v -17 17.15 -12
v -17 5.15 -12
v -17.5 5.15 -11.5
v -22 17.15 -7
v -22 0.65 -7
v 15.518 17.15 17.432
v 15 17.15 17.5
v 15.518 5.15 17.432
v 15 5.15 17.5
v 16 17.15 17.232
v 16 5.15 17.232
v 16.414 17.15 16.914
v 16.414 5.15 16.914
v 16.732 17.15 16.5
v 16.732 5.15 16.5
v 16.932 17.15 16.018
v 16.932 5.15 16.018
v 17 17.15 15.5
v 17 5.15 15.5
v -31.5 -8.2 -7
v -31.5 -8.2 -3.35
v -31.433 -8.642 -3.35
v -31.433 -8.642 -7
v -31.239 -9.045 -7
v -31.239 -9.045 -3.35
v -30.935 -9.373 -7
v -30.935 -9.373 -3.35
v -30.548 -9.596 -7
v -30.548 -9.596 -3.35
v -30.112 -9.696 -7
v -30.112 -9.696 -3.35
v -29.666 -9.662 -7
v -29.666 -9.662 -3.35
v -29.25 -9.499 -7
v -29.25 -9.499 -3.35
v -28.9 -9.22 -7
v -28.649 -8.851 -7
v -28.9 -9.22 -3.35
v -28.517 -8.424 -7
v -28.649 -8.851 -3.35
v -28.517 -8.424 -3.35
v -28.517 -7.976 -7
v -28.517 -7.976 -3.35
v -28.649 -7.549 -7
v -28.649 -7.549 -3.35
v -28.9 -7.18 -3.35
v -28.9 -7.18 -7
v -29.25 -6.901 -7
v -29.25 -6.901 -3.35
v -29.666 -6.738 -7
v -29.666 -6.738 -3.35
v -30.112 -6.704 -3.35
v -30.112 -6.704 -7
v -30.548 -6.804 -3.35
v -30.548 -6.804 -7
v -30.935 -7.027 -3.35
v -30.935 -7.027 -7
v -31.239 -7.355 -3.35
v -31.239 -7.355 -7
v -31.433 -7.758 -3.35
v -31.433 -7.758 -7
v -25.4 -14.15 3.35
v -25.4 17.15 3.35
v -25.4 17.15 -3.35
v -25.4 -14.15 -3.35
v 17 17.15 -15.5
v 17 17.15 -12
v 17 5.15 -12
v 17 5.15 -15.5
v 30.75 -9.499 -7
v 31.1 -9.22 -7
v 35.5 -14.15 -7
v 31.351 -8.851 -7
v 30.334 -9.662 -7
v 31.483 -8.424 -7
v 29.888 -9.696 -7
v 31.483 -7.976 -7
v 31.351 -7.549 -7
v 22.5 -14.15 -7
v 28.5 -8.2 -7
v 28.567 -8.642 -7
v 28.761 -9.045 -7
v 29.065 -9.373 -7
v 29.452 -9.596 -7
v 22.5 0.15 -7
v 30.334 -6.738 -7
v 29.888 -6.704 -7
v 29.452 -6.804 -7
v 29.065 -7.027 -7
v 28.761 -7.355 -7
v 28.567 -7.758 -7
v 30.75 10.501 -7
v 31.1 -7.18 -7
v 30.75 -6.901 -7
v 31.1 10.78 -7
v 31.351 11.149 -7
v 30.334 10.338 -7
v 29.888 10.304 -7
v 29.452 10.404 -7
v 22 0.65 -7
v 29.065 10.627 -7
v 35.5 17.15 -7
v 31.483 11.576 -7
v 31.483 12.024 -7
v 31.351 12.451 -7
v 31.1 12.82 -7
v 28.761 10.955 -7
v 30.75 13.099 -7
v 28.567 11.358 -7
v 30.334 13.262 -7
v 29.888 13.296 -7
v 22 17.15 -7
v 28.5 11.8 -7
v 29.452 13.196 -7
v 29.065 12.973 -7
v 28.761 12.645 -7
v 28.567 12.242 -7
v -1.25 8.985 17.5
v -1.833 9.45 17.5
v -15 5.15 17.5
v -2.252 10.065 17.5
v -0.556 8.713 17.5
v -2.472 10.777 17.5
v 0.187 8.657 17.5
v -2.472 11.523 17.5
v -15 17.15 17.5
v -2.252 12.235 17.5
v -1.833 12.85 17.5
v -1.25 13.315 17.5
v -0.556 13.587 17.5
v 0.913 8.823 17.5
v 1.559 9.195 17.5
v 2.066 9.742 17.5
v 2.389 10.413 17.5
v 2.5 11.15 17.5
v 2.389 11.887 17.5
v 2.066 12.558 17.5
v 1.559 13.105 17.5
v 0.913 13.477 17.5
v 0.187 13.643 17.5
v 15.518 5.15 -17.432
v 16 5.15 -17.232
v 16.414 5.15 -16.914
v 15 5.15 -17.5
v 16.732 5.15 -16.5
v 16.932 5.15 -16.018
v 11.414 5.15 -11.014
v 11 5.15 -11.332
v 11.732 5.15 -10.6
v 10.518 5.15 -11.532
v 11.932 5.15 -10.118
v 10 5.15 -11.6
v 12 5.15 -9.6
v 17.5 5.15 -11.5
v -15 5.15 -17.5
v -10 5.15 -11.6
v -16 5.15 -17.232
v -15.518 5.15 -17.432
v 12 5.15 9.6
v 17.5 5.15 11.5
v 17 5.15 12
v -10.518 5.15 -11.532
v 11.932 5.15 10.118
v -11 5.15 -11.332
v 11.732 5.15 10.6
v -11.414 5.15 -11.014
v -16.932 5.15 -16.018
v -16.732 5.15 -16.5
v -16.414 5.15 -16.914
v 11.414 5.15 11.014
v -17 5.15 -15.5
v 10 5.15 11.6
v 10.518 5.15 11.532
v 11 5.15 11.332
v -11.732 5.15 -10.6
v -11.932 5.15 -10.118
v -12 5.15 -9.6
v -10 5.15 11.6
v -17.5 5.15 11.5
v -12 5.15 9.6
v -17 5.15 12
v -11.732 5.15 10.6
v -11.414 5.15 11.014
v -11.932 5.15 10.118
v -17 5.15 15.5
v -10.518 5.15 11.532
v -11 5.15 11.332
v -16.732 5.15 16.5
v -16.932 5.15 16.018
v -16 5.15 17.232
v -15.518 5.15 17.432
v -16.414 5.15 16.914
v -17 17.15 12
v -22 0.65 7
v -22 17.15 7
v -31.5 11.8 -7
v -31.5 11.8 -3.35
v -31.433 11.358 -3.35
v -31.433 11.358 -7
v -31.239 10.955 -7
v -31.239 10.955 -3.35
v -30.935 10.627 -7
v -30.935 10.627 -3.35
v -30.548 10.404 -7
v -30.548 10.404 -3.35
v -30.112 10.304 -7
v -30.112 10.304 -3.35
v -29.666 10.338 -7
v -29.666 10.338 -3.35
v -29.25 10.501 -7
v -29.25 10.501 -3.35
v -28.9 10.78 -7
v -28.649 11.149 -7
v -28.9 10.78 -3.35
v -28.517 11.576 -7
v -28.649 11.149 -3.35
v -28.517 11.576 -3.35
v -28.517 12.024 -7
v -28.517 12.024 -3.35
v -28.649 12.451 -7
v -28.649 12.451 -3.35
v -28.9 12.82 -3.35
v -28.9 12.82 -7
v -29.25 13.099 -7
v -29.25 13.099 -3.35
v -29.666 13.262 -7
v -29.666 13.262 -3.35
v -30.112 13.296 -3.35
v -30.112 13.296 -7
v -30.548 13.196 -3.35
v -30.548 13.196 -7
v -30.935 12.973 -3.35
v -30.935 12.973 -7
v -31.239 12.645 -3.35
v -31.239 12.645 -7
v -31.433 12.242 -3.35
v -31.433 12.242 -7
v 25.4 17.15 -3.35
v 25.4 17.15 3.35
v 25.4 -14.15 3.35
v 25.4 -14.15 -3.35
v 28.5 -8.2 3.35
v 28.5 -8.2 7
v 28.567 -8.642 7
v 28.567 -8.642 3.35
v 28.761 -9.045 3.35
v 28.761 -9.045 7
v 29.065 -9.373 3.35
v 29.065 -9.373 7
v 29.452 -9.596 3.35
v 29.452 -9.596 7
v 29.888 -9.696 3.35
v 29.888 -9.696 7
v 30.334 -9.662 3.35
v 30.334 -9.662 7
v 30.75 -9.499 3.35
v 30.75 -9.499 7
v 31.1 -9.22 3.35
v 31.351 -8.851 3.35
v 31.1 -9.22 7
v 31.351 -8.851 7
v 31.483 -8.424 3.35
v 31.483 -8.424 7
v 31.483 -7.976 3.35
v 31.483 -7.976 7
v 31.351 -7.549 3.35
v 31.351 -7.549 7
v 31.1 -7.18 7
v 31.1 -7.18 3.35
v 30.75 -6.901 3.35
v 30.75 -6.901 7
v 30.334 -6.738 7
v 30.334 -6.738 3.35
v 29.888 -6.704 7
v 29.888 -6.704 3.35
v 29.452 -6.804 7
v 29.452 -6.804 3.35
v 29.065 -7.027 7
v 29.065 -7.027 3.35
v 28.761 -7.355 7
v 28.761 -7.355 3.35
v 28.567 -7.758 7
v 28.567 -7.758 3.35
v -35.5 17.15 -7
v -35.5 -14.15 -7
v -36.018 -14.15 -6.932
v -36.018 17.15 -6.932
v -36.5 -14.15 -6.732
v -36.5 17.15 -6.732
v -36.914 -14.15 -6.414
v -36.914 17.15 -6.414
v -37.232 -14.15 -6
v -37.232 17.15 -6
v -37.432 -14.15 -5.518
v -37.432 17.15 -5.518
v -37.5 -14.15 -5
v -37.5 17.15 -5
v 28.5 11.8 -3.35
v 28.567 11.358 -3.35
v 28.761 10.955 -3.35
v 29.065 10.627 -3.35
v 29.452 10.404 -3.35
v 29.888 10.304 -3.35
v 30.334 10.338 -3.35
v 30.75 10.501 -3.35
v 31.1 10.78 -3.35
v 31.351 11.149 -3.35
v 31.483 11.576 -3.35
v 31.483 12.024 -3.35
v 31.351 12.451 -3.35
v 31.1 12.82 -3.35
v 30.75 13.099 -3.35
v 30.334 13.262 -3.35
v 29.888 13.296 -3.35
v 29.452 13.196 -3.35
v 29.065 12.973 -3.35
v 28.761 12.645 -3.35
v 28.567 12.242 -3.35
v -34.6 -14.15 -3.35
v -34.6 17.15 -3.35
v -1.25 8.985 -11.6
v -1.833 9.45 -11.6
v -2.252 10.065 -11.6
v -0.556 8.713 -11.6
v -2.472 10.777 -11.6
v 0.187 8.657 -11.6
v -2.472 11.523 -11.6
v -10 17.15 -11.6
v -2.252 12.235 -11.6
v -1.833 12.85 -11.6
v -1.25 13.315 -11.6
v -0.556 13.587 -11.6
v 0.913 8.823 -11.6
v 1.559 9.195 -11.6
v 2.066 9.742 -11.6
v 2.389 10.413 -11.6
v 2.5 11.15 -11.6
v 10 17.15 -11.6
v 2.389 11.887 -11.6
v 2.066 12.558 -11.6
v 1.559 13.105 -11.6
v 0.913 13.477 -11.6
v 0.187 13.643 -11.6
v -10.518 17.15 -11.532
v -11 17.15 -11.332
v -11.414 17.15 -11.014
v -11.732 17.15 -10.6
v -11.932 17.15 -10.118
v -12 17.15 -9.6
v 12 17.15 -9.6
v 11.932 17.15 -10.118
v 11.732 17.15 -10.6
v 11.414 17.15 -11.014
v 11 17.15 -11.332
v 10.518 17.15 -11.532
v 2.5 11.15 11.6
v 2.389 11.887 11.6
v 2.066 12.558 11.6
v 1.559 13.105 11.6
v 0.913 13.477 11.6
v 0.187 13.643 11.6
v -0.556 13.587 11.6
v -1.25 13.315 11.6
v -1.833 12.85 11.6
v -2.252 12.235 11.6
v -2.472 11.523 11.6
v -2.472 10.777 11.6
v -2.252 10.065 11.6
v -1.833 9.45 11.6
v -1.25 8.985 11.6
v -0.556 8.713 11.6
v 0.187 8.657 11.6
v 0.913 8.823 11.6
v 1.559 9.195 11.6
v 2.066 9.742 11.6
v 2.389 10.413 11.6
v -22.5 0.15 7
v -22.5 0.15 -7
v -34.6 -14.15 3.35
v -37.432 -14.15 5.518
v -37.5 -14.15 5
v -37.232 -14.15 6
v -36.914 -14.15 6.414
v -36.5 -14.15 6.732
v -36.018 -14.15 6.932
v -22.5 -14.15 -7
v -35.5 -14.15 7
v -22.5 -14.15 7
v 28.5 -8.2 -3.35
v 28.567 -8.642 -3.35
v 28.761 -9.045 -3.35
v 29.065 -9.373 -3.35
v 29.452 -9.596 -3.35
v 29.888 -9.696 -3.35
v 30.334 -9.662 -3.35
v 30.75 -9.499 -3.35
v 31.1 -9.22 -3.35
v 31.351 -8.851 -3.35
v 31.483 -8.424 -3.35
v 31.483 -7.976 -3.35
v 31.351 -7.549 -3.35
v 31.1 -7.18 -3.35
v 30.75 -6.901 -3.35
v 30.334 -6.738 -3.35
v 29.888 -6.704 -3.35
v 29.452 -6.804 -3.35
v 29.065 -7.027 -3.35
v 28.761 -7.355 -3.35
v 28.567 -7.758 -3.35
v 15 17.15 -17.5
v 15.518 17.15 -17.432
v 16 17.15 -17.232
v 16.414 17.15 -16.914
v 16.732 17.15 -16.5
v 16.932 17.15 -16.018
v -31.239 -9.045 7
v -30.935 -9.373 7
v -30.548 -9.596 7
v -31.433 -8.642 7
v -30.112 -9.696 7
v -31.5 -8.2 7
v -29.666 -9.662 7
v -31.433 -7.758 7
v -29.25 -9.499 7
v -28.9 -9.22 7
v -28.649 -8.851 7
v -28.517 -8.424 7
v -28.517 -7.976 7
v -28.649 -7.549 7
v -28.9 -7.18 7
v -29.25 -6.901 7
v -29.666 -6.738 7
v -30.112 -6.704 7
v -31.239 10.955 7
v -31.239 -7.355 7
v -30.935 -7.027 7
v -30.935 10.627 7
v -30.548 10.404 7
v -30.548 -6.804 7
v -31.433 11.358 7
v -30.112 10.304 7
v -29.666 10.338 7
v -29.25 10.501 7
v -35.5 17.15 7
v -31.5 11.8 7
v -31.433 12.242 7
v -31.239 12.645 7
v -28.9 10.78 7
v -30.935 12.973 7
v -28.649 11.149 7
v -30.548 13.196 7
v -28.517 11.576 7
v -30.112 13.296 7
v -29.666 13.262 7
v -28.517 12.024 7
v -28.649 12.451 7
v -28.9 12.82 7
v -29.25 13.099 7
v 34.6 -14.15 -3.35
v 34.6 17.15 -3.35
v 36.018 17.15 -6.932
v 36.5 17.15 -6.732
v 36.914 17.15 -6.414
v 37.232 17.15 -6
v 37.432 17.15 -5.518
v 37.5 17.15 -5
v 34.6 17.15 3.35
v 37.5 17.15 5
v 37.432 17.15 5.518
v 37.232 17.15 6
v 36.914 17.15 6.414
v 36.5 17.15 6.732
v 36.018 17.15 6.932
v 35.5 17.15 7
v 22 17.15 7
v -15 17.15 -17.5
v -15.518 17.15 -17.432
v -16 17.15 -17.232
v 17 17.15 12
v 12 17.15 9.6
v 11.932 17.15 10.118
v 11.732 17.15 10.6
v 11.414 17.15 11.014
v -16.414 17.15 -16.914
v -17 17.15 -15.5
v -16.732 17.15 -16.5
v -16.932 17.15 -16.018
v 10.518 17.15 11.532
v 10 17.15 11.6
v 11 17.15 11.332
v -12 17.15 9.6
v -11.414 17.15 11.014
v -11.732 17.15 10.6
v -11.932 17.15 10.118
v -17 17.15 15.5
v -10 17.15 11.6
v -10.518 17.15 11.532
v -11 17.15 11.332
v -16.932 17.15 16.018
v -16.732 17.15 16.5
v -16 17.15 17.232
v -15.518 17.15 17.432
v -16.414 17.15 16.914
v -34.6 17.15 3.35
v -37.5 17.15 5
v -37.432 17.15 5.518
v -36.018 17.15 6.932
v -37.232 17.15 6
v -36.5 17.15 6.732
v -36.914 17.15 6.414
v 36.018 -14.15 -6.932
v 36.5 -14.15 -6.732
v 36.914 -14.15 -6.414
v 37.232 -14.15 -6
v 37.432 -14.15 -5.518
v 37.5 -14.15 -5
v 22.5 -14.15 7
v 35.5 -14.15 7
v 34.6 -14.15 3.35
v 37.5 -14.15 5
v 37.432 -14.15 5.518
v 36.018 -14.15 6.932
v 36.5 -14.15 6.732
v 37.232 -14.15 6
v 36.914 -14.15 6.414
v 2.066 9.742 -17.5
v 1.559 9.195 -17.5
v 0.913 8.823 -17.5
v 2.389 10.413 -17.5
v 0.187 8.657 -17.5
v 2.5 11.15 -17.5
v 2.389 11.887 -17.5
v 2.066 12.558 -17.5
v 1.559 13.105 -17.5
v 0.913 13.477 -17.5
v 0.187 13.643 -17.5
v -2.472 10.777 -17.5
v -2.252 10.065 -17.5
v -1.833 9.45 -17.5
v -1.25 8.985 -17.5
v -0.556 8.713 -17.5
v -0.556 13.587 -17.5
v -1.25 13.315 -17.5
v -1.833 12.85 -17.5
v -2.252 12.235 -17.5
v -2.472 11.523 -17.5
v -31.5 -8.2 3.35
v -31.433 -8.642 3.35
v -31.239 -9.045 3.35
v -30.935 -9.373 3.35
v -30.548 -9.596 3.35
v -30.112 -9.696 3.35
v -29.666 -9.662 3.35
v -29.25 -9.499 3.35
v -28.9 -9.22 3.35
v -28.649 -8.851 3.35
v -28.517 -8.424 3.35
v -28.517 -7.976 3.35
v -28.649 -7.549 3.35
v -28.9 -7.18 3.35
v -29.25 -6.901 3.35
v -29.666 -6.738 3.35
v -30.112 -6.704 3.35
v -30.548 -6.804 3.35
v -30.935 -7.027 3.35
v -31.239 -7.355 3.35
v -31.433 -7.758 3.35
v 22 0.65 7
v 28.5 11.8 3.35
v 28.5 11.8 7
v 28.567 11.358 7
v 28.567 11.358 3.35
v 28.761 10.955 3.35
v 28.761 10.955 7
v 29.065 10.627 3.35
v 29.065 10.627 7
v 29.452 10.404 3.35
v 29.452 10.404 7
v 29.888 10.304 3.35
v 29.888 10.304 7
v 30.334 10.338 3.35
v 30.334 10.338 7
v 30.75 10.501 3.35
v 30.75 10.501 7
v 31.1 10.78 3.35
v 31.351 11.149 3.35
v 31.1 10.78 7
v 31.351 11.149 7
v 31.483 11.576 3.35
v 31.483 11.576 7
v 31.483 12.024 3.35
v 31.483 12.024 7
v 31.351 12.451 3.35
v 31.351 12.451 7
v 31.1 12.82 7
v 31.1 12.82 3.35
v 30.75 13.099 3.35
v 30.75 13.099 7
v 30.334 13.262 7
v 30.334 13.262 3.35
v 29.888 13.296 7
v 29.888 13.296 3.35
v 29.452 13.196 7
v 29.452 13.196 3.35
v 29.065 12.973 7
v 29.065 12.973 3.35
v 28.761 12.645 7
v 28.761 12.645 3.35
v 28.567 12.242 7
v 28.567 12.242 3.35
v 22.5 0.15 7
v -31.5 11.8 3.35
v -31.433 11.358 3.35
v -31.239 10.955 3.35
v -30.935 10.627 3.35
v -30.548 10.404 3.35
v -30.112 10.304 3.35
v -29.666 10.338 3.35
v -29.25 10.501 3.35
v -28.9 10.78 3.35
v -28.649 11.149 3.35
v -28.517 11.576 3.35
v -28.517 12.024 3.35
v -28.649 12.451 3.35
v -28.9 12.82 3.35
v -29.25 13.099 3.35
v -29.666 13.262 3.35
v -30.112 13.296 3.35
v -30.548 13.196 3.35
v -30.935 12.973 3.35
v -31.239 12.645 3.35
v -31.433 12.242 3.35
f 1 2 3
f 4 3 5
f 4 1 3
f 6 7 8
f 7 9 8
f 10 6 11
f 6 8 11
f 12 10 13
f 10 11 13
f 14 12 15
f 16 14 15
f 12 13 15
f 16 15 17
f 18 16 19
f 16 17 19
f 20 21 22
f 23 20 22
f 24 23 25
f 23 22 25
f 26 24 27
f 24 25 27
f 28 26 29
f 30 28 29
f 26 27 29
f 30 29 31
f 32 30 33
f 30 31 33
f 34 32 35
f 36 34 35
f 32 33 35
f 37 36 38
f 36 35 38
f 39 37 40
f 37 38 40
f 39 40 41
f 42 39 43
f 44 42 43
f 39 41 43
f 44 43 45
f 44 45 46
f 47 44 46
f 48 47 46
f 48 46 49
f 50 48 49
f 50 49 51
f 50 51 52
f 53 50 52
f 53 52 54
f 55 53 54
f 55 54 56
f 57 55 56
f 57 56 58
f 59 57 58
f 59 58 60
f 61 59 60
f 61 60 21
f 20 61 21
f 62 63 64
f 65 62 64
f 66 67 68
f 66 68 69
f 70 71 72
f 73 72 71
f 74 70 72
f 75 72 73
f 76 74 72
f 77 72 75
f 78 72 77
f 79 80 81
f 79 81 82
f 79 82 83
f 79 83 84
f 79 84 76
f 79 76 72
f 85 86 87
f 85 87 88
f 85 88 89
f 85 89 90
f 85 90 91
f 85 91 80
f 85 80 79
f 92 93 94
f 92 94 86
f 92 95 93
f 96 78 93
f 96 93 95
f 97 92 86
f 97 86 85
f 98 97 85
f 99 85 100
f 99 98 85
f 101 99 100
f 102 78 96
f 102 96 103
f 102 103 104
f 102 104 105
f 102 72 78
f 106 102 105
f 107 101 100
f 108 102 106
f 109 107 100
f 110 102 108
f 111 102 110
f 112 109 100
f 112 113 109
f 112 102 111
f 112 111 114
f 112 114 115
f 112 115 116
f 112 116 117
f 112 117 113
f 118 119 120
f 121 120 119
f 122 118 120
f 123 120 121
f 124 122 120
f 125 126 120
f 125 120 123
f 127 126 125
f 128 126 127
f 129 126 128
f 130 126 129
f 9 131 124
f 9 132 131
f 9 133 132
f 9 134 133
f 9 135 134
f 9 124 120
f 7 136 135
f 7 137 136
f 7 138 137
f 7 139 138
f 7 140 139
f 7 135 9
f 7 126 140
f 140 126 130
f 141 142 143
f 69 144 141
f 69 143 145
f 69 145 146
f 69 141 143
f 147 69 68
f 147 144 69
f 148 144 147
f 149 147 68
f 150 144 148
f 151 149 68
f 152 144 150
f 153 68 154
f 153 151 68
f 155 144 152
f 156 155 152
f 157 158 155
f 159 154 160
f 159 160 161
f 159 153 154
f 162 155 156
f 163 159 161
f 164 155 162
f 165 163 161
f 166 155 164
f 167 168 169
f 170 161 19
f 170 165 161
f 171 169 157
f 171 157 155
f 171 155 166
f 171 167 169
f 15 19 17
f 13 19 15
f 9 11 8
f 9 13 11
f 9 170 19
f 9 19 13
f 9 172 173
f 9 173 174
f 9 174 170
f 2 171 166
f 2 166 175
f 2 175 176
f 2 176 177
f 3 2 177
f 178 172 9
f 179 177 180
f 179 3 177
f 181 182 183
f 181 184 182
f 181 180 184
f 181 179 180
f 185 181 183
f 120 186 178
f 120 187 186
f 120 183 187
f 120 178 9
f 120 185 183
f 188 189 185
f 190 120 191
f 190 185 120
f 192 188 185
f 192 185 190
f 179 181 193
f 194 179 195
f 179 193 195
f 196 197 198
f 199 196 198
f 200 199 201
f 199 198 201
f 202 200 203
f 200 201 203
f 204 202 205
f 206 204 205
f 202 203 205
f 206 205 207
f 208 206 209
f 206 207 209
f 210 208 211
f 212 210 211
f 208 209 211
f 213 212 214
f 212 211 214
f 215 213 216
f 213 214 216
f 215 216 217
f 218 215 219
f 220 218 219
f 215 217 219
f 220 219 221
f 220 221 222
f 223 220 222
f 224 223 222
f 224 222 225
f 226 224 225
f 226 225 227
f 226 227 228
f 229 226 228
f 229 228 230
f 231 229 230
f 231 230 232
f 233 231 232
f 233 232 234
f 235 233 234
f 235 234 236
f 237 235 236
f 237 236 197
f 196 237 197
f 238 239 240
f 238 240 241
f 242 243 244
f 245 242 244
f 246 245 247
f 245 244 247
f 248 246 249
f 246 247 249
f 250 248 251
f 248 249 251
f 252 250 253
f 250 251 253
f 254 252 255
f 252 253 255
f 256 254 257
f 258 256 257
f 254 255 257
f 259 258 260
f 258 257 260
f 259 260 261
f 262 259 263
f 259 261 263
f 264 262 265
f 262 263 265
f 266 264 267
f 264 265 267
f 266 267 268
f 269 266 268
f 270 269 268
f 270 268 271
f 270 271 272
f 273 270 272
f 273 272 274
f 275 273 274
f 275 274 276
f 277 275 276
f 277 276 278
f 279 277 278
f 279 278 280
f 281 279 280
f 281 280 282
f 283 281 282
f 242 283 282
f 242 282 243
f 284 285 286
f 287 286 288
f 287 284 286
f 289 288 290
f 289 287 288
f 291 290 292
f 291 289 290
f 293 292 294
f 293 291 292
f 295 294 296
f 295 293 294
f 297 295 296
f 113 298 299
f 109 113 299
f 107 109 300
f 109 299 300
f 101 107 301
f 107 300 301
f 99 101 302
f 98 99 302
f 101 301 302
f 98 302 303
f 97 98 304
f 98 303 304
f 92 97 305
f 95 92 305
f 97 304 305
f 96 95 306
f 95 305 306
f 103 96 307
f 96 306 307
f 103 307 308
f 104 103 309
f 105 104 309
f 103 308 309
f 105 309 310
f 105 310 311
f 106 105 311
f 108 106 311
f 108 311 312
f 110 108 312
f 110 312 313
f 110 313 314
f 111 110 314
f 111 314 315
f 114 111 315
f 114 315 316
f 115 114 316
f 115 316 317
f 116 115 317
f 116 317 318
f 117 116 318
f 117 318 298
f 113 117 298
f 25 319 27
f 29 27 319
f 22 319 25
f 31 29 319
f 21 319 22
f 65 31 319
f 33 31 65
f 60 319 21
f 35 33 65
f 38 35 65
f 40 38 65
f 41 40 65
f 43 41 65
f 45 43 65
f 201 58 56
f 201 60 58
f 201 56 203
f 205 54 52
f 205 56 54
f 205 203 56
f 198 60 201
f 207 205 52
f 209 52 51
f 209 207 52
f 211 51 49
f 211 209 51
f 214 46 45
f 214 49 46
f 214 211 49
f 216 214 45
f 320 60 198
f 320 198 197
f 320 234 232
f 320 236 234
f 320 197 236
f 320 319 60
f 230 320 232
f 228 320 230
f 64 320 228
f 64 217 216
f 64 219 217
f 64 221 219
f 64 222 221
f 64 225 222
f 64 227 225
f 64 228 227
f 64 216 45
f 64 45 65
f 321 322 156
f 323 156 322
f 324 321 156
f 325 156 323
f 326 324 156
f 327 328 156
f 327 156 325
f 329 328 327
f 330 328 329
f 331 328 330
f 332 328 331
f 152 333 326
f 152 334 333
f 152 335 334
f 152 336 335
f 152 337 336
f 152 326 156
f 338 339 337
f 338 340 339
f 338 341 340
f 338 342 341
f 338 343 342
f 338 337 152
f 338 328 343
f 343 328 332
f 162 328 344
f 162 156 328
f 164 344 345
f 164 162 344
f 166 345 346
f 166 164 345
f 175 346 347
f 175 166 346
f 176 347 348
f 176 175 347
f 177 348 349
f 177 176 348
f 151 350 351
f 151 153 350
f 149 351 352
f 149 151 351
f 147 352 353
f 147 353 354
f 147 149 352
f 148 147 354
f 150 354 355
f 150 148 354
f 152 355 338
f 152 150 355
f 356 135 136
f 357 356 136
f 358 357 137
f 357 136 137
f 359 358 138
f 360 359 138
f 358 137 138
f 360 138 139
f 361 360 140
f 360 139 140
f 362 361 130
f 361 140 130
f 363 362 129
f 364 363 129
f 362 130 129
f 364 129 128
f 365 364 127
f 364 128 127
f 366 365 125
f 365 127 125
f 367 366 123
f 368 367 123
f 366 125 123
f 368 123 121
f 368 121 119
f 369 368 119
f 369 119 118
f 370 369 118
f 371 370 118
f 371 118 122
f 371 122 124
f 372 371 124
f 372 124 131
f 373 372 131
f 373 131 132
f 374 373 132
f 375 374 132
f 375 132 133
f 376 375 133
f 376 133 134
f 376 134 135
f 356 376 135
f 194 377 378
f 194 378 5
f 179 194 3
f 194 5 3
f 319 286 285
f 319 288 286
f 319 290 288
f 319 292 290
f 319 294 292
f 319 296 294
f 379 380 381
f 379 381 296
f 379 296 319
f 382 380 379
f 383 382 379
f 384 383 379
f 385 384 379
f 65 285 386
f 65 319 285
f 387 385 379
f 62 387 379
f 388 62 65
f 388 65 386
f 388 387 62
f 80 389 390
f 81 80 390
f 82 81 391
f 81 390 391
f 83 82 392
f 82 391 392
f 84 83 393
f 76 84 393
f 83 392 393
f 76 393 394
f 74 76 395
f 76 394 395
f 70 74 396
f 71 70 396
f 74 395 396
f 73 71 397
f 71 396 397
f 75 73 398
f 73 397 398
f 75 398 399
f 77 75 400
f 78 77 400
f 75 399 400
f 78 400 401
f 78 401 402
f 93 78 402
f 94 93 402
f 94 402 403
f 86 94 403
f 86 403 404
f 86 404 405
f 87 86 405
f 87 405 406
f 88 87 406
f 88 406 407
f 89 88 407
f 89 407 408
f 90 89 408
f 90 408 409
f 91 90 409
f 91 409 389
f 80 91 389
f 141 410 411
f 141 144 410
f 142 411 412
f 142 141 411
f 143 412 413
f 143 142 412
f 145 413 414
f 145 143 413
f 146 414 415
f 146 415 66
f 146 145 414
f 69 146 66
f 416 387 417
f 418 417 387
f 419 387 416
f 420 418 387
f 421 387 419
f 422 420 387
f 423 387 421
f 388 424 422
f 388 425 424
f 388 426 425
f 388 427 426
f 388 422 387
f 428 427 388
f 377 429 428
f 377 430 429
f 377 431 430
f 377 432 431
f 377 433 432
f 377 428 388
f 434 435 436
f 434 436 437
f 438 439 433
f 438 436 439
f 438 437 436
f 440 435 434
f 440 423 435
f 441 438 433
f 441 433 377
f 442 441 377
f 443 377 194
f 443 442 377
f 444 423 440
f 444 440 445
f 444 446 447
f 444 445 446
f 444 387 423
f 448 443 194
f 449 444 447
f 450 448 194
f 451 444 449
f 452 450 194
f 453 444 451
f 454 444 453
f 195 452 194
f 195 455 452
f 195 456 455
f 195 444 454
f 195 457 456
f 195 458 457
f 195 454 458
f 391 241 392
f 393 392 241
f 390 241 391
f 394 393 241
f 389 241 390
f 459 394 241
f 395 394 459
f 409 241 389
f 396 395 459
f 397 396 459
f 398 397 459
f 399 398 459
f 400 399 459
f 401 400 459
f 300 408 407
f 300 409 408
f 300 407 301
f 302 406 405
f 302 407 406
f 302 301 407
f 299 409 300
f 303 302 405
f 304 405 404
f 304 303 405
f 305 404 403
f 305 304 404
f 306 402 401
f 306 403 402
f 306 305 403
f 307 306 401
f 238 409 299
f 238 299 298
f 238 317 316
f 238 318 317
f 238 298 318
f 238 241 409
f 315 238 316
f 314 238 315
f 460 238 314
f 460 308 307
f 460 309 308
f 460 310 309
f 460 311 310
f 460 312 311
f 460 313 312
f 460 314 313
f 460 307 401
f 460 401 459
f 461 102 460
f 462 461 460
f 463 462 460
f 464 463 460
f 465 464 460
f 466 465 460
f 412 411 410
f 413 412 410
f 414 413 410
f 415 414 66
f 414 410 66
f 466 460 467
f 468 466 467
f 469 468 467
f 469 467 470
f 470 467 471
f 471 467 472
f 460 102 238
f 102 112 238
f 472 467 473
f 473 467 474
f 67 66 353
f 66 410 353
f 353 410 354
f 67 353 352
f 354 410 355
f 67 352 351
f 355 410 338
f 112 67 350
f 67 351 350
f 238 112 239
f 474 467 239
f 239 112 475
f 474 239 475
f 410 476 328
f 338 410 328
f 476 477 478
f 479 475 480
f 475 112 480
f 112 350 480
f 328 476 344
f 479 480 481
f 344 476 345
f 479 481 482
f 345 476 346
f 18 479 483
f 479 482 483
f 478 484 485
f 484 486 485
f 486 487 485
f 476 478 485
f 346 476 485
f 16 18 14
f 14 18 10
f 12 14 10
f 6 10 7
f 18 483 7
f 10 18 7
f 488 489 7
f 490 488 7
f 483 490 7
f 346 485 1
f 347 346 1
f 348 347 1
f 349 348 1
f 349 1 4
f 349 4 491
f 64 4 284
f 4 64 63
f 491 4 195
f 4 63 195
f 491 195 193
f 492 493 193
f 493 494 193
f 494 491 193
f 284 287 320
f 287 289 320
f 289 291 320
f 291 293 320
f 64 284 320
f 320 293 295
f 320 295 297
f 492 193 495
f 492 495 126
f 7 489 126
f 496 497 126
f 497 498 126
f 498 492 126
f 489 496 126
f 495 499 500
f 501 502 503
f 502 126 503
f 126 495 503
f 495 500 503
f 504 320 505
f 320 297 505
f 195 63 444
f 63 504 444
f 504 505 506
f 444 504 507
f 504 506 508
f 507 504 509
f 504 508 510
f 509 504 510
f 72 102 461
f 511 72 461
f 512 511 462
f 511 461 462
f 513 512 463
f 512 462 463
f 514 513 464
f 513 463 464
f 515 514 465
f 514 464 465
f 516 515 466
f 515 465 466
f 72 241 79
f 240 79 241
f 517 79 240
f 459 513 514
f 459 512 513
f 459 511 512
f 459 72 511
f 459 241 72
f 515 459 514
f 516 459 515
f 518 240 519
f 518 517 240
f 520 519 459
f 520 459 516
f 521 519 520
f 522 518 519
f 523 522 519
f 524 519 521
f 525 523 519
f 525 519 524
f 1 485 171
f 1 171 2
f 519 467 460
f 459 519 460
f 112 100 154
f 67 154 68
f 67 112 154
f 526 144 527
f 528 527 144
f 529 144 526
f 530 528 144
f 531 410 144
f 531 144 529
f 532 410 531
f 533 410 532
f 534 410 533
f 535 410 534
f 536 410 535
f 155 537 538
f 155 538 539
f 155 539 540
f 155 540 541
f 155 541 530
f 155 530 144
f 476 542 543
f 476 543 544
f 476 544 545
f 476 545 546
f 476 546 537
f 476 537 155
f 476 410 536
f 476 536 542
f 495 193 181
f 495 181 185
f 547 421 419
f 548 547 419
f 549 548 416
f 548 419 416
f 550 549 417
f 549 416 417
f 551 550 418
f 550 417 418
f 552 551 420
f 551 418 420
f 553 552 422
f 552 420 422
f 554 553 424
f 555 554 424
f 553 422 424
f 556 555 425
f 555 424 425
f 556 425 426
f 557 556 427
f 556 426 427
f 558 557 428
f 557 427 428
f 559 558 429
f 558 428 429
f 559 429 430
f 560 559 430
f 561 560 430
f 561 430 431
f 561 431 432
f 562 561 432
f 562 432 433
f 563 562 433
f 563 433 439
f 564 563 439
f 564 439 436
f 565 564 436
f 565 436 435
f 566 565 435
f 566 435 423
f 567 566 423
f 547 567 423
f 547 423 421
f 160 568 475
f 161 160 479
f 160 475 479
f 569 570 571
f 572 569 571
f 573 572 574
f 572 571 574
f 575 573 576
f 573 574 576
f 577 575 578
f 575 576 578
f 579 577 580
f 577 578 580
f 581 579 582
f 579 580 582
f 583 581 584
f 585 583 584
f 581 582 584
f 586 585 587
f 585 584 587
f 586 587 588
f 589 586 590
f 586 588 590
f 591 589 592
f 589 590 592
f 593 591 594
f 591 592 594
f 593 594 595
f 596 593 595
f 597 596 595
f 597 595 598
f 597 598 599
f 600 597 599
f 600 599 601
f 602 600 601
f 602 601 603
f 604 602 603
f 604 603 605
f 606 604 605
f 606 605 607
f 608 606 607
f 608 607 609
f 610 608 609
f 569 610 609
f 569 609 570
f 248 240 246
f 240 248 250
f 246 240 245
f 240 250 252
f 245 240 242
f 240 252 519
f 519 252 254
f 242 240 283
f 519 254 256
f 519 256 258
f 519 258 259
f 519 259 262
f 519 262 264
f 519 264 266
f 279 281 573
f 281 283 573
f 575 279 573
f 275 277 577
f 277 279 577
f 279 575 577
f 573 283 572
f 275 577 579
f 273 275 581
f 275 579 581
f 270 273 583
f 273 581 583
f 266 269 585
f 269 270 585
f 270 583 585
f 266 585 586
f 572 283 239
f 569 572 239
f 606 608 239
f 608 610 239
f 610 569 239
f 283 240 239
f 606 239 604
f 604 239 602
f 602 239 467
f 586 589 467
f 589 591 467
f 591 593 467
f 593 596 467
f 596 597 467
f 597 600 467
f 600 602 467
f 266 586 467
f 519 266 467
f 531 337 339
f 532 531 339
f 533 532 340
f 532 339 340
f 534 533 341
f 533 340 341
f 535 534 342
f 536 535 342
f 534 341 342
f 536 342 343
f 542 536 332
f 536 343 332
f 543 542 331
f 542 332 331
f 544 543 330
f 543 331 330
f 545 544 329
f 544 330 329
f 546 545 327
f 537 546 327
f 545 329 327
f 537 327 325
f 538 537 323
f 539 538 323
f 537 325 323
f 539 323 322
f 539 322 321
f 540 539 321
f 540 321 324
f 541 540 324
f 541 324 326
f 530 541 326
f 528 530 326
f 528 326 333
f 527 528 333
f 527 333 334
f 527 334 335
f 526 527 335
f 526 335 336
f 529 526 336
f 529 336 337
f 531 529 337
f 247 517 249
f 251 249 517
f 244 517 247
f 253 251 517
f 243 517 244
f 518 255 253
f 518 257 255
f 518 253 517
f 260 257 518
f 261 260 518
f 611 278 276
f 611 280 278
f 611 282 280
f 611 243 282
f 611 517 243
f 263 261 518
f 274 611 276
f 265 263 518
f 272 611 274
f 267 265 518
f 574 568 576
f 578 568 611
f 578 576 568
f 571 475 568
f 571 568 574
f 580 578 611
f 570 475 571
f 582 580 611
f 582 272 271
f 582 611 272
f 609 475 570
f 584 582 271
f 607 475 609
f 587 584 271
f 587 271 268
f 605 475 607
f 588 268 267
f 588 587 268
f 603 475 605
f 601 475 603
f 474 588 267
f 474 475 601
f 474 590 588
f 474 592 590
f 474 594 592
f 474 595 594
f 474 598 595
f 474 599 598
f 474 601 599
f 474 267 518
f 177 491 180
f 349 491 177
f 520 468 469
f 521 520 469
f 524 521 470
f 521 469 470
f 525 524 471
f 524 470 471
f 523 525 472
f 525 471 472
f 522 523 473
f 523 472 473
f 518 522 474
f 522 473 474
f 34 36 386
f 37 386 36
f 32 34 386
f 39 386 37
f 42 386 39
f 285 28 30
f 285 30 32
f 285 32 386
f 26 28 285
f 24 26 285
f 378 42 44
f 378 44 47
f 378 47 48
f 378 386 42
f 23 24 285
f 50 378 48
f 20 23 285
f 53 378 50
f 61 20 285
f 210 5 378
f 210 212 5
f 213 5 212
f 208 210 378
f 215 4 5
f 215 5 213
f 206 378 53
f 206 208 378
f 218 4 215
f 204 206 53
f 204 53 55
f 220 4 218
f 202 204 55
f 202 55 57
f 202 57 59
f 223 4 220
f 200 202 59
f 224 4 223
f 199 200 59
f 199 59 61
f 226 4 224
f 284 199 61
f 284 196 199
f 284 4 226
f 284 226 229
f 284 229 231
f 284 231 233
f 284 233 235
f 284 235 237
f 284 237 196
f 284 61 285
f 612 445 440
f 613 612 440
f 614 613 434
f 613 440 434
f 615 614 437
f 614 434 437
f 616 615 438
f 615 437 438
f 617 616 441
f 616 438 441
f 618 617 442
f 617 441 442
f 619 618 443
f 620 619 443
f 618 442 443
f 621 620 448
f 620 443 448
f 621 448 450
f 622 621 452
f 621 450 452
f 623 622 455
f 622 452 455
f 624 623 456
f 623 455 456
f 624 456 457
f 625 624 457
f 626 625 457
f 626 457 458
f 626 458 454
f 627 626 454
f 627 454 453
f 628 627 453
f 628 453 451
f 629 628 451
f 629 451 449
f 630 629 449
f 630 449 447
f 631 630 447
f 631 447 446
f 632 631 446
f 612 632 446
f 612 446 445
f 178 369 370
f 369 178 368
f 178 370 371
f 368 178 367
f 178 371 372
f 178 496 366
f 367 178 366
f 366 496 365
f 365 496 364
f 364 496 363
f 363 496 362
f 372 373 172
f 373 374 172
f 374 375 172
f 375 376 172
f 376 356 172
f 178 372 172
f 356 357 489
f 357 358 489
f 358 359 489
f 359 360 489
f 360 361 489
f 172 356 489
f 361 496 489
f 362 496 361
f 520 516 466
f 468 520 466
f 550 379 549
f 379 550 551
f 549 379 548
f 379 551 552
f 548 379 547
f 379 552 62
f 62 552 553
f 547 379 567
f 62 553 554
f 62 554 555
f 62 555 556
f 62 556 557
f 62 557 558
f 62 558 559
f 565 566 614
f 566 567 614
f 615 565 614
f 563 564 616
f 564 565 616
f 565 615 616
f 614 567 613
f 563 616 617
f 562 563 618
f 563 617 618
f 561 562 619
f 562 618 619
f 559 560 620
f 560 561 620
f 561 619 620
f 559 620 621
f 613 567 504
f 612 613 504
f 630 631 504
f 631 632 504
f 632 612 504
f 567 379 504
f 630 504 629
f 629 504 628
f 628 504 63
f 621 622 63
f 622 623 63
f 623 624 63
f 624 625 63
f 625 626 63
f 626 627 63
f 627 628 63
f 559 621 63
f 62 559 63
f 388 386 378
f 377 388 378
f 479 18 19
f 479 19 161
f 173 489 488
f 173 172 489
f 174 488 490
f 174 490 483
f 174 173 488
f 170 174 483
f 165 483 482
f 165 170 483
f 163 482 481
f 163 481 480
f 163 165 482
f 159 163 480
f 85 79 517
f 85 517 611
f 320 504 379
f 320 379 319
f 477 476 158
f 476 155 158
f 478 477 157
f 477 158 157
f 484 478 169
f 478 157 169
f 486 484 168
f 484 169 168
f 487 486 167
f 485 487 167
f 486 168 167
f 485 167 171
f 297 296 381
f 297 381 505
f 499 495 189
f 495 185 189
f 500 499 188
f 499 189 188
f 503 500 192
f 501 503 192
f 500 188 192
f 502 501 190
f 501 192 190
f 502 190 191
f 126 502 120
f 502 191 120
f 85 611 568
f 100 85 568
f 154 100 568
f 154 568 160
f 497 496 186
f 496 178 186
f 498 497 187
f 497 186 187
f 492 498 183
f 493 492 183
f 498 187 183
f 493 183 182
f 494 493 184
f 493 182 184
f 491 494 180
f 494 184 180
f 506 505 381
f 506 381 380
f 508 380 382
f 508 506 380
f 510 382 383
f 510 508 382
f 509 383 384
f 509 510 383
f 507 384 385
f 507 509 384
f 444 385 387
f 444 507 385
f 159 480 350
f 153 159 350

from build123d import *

# Parameters (mm, degrees)
EXTRUDE_1_DEPTH        = 7
EXTRUDE_1_DEPTH_BACK   = 7
SKETCH_1_W             = 15
SKETCH_1_H             = 34.3
EXTRUDE_1_2_DEPTH      = 7
EXTRUDE_1_2_DEPTH_BACK = 7
SKETCH_2_W             = 9.2
SKETCH_2_H             = 6.7
CUT_EXTRUDE_1_DEPTH    = 62
SKETCH_3_W             = 24
SKETCH_3_H             = 23.2
EXTRUDE_2_DEPTH        = 12
SKETCH_4_R             = 2.5
CUT_EXTRUDE_2_DEPTH    = 90
FILLET_1_R             = 2
CHAMFER_1_SIZE         = 5
CHAMFER_2_SIZE         = 5
FILLET_2_R             = 2
SKETCH_7_R             = 1.5
CUT_EXTRUDE_3_DEPTH    = 34
SKETCH_9_W             = 15
SKETCH_9_H             = 3
CUT_EXTRUDE_4_DEPTH    = 34


with BuildPart() as part:
    # 草图1 → 凸台-拉伸1 (new, two sides: drawn at the far end of the back side and taken through both)
    with BuildSketch(Plane.XY.offset(-EXTRUDE_1_DEPTH_BACK)):
        with Locations((30, 0)):
            Rectangle(SKETCH_1_W, SKETCH_1_H)
    extrude(amount=EXTRUDE_1_DEPTH + EXTRUDE_1_DEPTH_BACK)


with BuildPart() as body_2:
    # 草图1 → Extrude 1 2 (new, two sides: drawn at the far end of the back side and taken through both)
    with BuildSketch(Plane.XY.offset(-EXTRUDE_1_2_DEPTH_BACK)):
        with Locations((-30, 0)):
            Rectangle(SKETCH_1_W, SKETCH_1_H)
    extrude(amount=EXTRUDE_1_2_DEPTH + EXTRUDE_1_2_DEPTH_BACK)


with BuildPart() as cut_extrude_1_tool:
    # 草图2 → 切除-拉伸1 (new body)
    with BuildSketch(Plane(origin=(0, 17.15, 0), x_dir=(1, 0, 0), z_dir=(0, 1, 0))):
        with Locations((30, 0)):
            Rectangle(SKETCH_2_W, SKETCH_2_H)
        with Locations((-30, 0)):
            Rectangle(SKETCH_2_W, SKETCH_2_H)
    extrude(amount=-CUT_EXTRUDE_1_DEPTH)


with BuildPart() as part_1:
    add(part.part)

    # 切除-拉伸1: cut by cut_extrude_1_tool
    add(cut_extrude_1_tool.part, mode=Mode.SUBTRACT)



with BuildPart() as body_2_1:
    add(body_2.part)

    # 切除-拉伸1: cut by cut_extrude_1_tool
    add(cut_extrude_1_tool.part, mode=Mode.SUBTRACT)


with BuildPart() as part_2:
    add(part_1.part)

    add(body_2_1.part)  # 凸台-拉伸2 merges body 2
    # 草图3 → 凸台-拉伸2 (add)
    with BuildSketch(Plane(origin=(0, 17.15, 0), x_dir=(1, 0, 0), z_dir=(0, 1, 0))):
        Polygon((22.5, 7), (17, 7), (17, 17.5), (-17, 17.5), (-17, 7), (-22.5, 7), (-22.5, -7), (-17, -7), (-17, -17.5), (17, -17.5), (17, -7), (22.5, -7), align=None)
        Rectangle(SKETCH_3_W, SKETCH_3_H, mode=Mode.SUBTRACT)
    extrude(amount=-EXTRUDE_2_DEPTH)

    # 草图4 → 切除-拉伸2 (cut)
    with BuildSketch(Plane.XY.offset(17.5)):
        with Locations((0, 11.15)):
            Circle(SKETCH_4_R)
    extrude(amount=-CUT_EXTRUDE_2_DEPTH, mode=Mode.SUBTRACT)

    # 圆角1
    fillet_1_edges = [part_2.edges().sort_by_distance(p)[0] for p in [
        (-37.5, 0, -7),
        (-37.5, 0, 7),
        (37.5, 0, 7),
        (37.5, 0, -7),
    ]]
    fillet(fillet_1_edges, radius=FILLET_1_R)

    # 倒角1
    chamfer_1_edges = [part_2.edges().sort_by_distance(p)[0] for p in [
        (22.5, 5.15, 0),
        (-22.5, 5.15, 0),
    ]]
    chamfer(chamfer_1_edges, length=CHAMFER_1_SIZE)

    # 倒角2
    # the kernel refuses this chamfer: 5 mm, written as the material it adds along each edge
    with BuildSketch(Plane(origin=(17, 17.15, -7), x_dir=(0.9996219169112968, 0, 0.027495876610586147), z_dir=(0, -1, 0))) as chamfer_2_piece_1_section:
        Polygon((CHAMFER_2_SIZE * 0.999621916911, -CHAMFER_2_SIZE * 0.0274958766106), (-CHAMFER_2_SIZE * 0.0274958766106, -CHAMFER_2_SIZE * 0.999621916911), (0, 0), align=None)
    chamfer_2_piece_1 = extrude(amount=12, mode=Mode.PRIVATE)
    chamfer_2_piece_1 = split(chamfer_2_piece_1, bisect_by=Plane(origin=(15.061953737, 7.588046263, -8.643148294), z_dir=(0.7071067811865476, 0.7071067811865475, 0)), keep=Keep.TOP, mode=Mode.PRIVATE)
    add(chamfer_2_piece_1)
    with BuildSketch(Plane(origin=(17, 17.15, -7), x_dir=(0.9996219169112968, 0, 0.027495876610586147), z_dir=(0, -1, 0))) as chamfer_2_piece_2_section:
        Polygon((CHAMFER_2_SIZE * 0.999621916911, -CHAMFER_2_SIZE * 0.0274958766106), (-CHAMFER_2_SIZE * 0.0274958766106, -CHAMFER_2_SIZE * 0.999621916911), (0, 0), align=None)
    chamfer_2_piece_2 = extrude(amount=12, mode=Mode.PRIVATE)
    chamfer_2_piece_2 = split(chamfer_2_piece_2, bisect_by=Plane(origin=(17.181894142, 5.468105858, -9.627776216), z_dir=(-0.7071067811865476, -0.7071067811865475, 0)), keep=Keep.TOP, mode=Mode.PRIVATE)
    add(chamfer_2_piece_2)
    with BuildSketch(Plane(origin=(17, 17.15, -7), x_dir=(0.9996219169112968, 0, 0.027495876610586147), z_dir=(0, -1, 0))) as chamfer_2_piece_3_section:
        Polygon((CHAMFER_2_SIZE * 0.999621916911, -CHAMFER_2_SIZE * 0.0274958766106), (-CHAMFER_2_SIZE * 0.0274958766106, -CHAMFER_2_SIZE * 0.999621916911), (0, 0), align=None)
    chamfer_2_piece_3 = extrude(amount=24.85841494, mode=Mode.PRIVATE)
    chamfer_2_piece_3 = split(chamfer_2_piece_3, bisect_by=Plane(origin=(19.269171179, 3.380828821, -8.010149173), z_dir=(0.7071067811865476, 0.7071067811865475, 0)), keep=Keep.TOP, mode=Mode.PRIVATE)
    chamfer_2_piece_3 = split(chamfer_2_piece_3, bisect_by=Plane(origin=(19.858894906, 5.15, -8.010149173), z_dir=(0, -1, 0)), keep=Keep.TOP, mode=Mode.PRIVATE)
    add(chamfer_2_piece_3)
    with BuildSketch(Plane(origin=(-17, 17.15, -7), x_dir=(0.027495876610586313, 0, -0.9996219169112968), z_dir=(0, -1, 0))) as chamfer_2_piece_4_section:
        Polygon((CHAMFER_2_SIZE * 0.999621916911, -CHAMFER_2_SIZE * 0.0274958766106), (-CHAMFER_2_SIZE * 0.0274958766106, -CHAMFER_2_SIZE * 0.999621916911), (0, 0), align=None)
    chamfer_2_piece_4 = extrude(amount=12, mode=Mode.PRIVATE)
    chamfer_2_piece_4 = split(chamfer_2_piece_4, bisect_by=Plane(origin=(-15.061953737, 7.588046263, -8.643148294), z_dir=(-0.7071067811865475, 0.7071067811865476, 0)), keep=Keep.TOP, mode=Mode.PRIVATE)
    add(chamfer_2_piece_4)
    with BuildSketch(Plane(origin=(-17, 17.15, -7), x_dir=(0.027495876610586313, 0, -0.9996219169112968), z_dir=(0, -1, 0))) as chamfer_2_piece_5_section:
        Polygon((CHAMFER_2_SIZE * 0.999621916911, -CHAMFER_2_SIZE * 0.0274958766106), (-CHAMFER_2_SIZE * 0.0274958766106, -CHAMFER_2_SIZE * 0.999621916911), (0, 0), align=None)
    chamfer_2_piece_5 = extrude(amount=24.85841494, mode=Mode.PRIVATE)
    chamfer_2_piece_5 = split(chamfer_2_piece_5, bisect_by=Plane(origin=(-19.858894906, 5.15, -8.010149173), z_dir=(0, -1, 0)), keep=Keep.TOP, mode=Mode.PRIVATE)
    chamfer_2_piece_5 = split(chamfer_2_piece_5, bisect_by=Plane(origin=(-19.269171179, 3.380828821, -8.010149173), z_dir=(-0.7071067811865475, 0.7071067811865476, 0)), keep=Keep.TOP, mode=Mode.PRIVATE)
    add(chamfer_2_piece_5)
    with BuildSketch(Plane(origin=(-17, 17.15, -7), x_dir=(0.027495876610586313, 0, -0.9996219169112968), z_dir=(0, -1, 0))) as chamfer_2_piece_6_section:
        Polygon((CHAMFER_2_SIZE * 0.999621916911, -CHAMFER_2_SIZE * 0.0274958766106), (-CHAMFER_2_SIZE * 0.0274958766106, -CHAMFER_2_SIZE * 0.999621916911), (0, 0), align=None)
    chamfer_2_piece_6 = extrude(amount=12, mode=Mode.PRIVATE)
    chamfer_2_piece_6 = split(chamfer_2_piece_6, bisect_by=Plane(origin=(-17.181894142, 5.468105858, -9.627776216), z_dir=(0.7071067811865475, -0.7071067811865476, 0)), keep=Keep.TOP, mode=Mode.PRIVATE)
    add(chamfer_2_piece_6)
    with BuildSketch(Plane(origin=(17, 17.15, 7), x_dir=(0.9996219169112968, 0, -0.027495876610586147), z_dir=(0, -1, 0))) as chamfer_2_piece_7_section:
        Polygon((CHAMFER_2_SIZE * 0.999621916911, CHAMFER_2_SIZE * 0.0274958766106), (-CHAMFER_2_SIZE * 0.0274958766106, CHAMFER_2_SIZE * 0.999621916911), (0, 0), align=None)
    chamfer_2_piece_7 = extrude(amount=12, mode=Mode.PRIVATE)
    chamfer_2_piece_7 = split(chamfer_2_piece_7, bisect_by=Plane(origin=(15.061953737, 7.588046263, 8.643148294), z_dir=(0.7071067811865476, 0.7071067811865475, 0)), keep=Keep.TOP, mode=Mode.PRIVATE)
    add(chamfer_2_piece_7)
    with BuildSketch(Plane(origin=(17, 17.15, 7), x_dir=(0.9996219169112968, 0, -0.027495876610586147), z_dir=(0, -1, 0))) as chamfer_2_piece_8_section:
        Polygon((CHAMFER_2_SIZE * 0.999621916911, CHAMFER_2_SIZE * 0.0274958766106), (-CHAMFER_2_SIZE * 0.0274958766106, CHAMFER_2_SIZE * 0.999621916911), (0, 0), align=None)
    chamfer_2_piece_8 = extrude(amount=12, mode=Mode.PRIVATE)
    chamfer_2_piece_8 = split(chamfer_2_piece_8, bisect_by=Plane(origin=(17.181894142, 5.468105858, 9.627776216), z_dir=(-0.7071067811865476, -0.7071067811865475, 0)), keep=Keep.TOP, mode=Mode.PRIVATE)
    add(chamfer_2_piece_8)
    with BuildSketch(Plane(origin=(17, 17.15, 7), x_dir=(0.9996219169112968, 0, -0.027495876610586147), z_dir=(0, -1, 0))) as chamfer_2_piece_9_section:
        Polygon((CHAMFER_2_SIZE * 0.999621916911, CHAMFER_2_SIZE * 0.0274958766106), (-CHAMFER_2_SIZE * 0.0274958766106, CHAMFER_2_SIZE * 0.999621916911), (0, 0), align=None)
    chamfer_2_piece_9 = extrude(amount=24.85841494, mode=Mode.PRIVATE)
    chamfer_2_piece_9 = split(chamfer_2_piece_9, bisect_by=Plane(origin=(19.269171179, 3.380828821, 8.010149173), z_dir=(0.7071067811865476, 0.7071067811865475, 0)), keep=Keep.TOP, mode=Mode.PRIVATE)
    chamfer_2_piece_9 = split(chamfer_2_piece_9, bisect_by=Plane(origin=(19.858894906, 5.15, 8.010149173), z_dir=(0, -1, 0)), keep=Keep.TOP, mode=Mode.PRIVATE)
    add(chamfer_2_piece_9)
    with BuildSketch(Plane(origin=(-17, 17.15, 7), x_dir=(0.027495876610586313, 0, 0.9996219169112968), z_dir=(0, -1, 0))) as chamfer_2_piece_10_section:
        Polygon((CHAMFER_2_SIZE * 0.999621916911, CHAMFER_2_SIZE * 0.0274958766106), (-CHAMFER_2_SIZE * 0.0274958766106, CHAMFER_2_SIZE * 0.999621916911), (0, 0), align=None)
    chamfer_2_piece_10 = extrude(amount=12, mode=Mode.PRIVATE)
    chamfer_2_piece_10 = split(chamfer_2_piece_10, bisect_by=Plane(origin=(-15.061953737, 7.588046263, 8.643148294), z_dir=(-0.7071067811865475, 0.7071067811865476, 0)), keep=Keep.TOP, mode=Mode.PRIVATE)
    add(chamfer_2_piece_10)
    with BuildSketch(Plane(origin=(-17, 17.15, 7), x_dir=(0.027495876610586313, 0, 0.9996219169112968), z_dir=(0, -1, 0))) as chamfer_2_piece_11_section:
        Polygon((CHAMFER_2_SIZE * 0.999621916911, CHAMFER_2_SIZE * 0.0274958766106), (-CHAMFER_2_SIZE * 0.0274958766106, CHAMFER_2_SIZE * 0.999621916911), (0, 0), align=None)
    chamfer_2_piece_11 = extrude(amount=24.85841494, mode=Mode.PRIVATE)
    chamfer_2_piece_11 = split(chamfer_2_piece_11, bisect_by=Plane(origin=(-19.858894906, 5.15, 8.010149173), z_dir=(0, -1, 0)), keep=Keep.TOP, mode=Mode.PRIVATE)
    chamfer_2_piece_11 = split(chamfer_2_piece_11, bisect_by=Plane(origin=(-19.269171179, 3.380828821, 8.010149173), z_dir=(-0.7071067811865475, 0.7071067811865476, 0)), keep=Keep.TOP, mode=Mode.PRIVATE)
    add(chamfer_2_piece_11)
    with BuildSketch(Plane(origin=(-17, 17.15, 7), x_dir=(0.027495876610586313, 0, 0.9996219169112968), z_dir=(0, -1, 0))) as chamfer_2_piece_12_section:
        Polygon((CHAMFER_2_SIZE * 0.999621916911, CHAMFER_2_SIZE * 0.0274958766106), (-CHAMFER_2_SIZE * 0.0274958766106, CHAMFER_2_SIZE * 0.999621916911), (0, 0), align=None)
    chamfer_2_piece_12 = extrude(amount=12, mode=Mode.PRIVATE)
    chamfer_2_piece_12 = split(chamfer_2_piece_12, bisect_by=Plane(origin=(-17.181894142, 5.468105858, 9.627776216), z_dir=(0.7071067811865475, -0.7071067811865476, 0)), keep=Keep.TOP, mode=Mode.PRIVATE)
    add(chamfer_2_piece_12)

    # 圆角2
    fillet_2_edges = [part_2.edges().sort_by_distance(p)[0] for p in [
        (17, 11.15, 17.5),
        (-17, 11.15, 17.5),
        (-17, 11.15, -17.5),
        (17, 11.15, -17.5),
        (12, 11.15, 11.6),
        (-12, 11.15, 11.6),
        (-12, 11.15, -11.6),
        (12, 11.15, -11.6),
    ]]
    fillet(fillet_2_edges, radius=FILLET_2_R)

    # 草图7 → 切除-拉伸3 (cut)
    with BuildSketch(Plane.XY.offset(7)):
        with Locations(Location((30, 11.8, 0), (0, 0, 180))):
            Circle(SKETCH_7_R)
        with Locations(Location((30, -8.2, 0), (0, 0, 180))):
            Circle(SKETCH_7_R)
        with Locations(Location((-30, -8.2, 0), (0, 0, 180))):
            Circle(SKETCH_7_R)
        with Locations(Location((-30, 11.8, 0), (0, 0, 180))):
            Circle(SKETCH_7_R)
    extrude(amount=-CUT_EXTRUDE_3_DEPTH, mode=Mode.SUBTRACT)

    # 草图9 → 切除-拉伸4 (cut)
    with BuildSketch(Plane.XY.offset(7)):
        with Locations((-30, -15.65)):
            Rectangle(SKETCH_9_W, SKETCH_9_H)
        with Locations((30, -15.65)):
            Rectangle(SKETCH_9_W, SKETCH_9_H)
    extrude(amount=-CUT_EXTRUDE_4_DEPTH, mode=Mode.SUBTRACT)


solid = part_2.part
